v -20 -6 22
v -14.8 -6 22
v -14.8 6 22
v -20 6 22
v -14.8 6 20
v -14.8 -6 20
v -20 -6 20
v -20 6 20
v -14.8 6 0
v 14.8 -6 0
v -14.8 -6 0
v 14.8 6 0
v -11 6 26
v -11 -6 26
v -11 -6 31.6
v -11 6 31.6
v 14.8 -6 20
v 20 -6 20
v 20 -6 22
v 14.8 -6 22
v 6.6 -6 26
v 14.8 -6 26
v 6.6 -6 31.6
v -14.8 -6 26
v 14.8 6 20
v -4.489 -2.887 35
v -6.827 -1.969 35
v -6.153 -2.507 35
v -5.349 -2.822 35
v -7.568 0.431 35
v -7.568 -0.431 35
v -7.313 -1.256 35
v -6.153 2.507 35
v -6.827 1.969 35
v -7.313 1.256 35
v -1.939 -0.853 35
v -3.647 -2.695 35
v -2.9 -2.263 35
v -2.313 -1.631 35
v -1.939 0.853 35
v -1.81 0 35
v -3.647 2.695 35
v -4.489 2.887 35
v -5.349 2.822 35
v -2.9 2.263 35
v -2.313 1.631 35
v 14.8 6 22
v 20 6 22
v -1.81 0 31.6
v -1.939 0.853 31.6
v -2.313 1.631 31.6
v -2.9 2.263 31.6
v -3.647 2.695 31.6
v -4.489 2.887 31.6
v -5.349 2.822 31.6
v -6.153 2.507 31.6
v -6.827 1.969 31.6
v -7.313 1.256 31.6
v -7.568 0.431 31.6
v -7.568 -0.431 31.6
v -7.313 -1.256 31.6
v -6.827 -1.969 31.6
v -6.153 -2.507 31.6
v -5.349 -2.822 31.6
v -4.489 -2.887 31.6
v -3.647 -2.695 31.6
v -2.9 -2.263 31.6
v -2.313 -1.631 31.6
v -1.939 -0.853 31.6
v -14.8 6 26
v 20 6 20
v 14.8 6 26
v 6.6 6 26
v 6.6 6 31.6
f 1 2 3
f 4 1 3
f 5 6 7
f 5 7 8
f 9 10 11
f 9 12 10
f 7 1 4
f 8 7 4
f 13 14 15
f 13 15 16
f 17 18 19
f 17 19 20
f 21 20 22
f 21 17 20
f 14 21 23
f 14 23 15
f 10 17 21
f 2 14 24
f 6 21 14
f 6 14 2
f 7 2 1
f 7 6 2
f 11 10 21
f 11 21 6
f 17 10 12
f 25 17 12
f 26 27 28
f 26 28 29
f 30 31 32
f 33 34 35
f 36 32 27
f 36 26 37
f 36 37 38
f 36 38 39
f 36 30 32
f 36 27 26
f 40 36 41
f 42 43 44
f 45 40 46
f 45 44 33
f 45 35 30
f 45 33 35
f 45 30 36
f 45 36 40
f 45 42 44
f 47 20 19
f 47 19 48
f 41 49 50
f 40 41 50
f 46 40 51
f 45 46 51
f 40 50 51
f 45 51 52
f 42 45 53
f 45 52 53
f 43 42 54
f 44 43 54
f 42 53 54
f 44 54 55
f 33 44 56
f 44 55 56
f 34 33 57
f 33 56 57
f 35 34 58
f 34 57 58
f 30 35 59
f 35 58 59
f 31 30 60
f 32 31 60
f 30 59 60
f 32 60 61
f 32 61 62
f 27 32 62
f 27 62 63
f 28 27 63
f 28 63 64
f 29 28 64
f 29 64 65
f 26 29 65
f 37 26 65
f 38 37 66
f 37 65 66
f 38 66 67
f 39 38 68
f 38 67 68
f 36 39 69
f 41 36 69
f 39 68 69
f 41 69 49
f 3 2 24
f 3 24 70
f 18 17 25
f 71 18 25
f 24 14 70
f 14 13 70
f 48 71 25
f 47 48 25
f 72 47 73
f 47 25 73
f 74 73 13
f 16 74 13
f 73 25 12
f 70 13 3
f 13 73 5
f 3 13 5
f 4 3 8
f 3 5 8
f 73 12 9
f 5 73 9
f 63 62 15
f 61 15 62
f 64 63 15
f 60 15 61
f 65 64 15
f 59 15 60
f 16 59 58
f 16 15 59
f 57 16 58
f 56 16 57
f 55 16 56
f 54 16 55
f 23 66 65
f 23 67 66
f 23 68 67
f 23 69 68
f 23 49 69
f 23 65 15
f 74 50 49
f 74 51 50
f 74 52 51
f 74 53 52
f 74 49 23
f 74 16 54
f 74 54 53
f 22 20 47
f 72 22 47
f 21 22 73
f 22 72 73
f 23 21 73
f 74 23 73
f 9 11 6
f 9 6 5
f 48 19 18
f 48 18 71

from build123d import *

# Parameters (mm, degrees)
F0_W     = 14.8
F0_H     = 12
F1_DEPTH = 26
F2_W     = 12
F2_H     = 2
F3_DEPTH = 5.2
F5_W     = 17.6
F5_H     = 12
F6_DEPTH = 5.6
F7_R     = 2.895
F8_DEPTH = 3.4


with BuildPart() as f1:
    # F0 (on Top) → F1 (new body)
    with BuildSketch(Plane.XY):
        with Locations((7.4, 0)):
            Rectangle(F0_W, F0_H)
    extrude(amount=F1_DEPTH)

    # F2 (on face) → F3 (join)
    with BuildSketch(Plane.YZ.offset(14.8)):
        with Locations((0, 21)):
            Rectangle(F2_W, F2_H)
    extrude(amount=F3_DEPTH)

    # F4: F1 across plane


with BuildPart() as f1_1:
    add(f1.part)
    add(f1.part.mirror(Plane.YZ))

    # F5 (on face) → F6 (join)
    with BuildSketch(Plane.XY.offset(26)):
        with Locations((-2.2, 0)):
            Rectangle(F5_W, F5_H)
    extrude(amount=F6_DEPTH)

    # F7 (on face) → F8 (join)
    with BuildSketch(Plane.XY.offset(31.6)):
        with Locations((-4.705, 0)):
            Circle(F7_R)
    extrude(amount=F8_DEPTH)


solid = f1_1.part
